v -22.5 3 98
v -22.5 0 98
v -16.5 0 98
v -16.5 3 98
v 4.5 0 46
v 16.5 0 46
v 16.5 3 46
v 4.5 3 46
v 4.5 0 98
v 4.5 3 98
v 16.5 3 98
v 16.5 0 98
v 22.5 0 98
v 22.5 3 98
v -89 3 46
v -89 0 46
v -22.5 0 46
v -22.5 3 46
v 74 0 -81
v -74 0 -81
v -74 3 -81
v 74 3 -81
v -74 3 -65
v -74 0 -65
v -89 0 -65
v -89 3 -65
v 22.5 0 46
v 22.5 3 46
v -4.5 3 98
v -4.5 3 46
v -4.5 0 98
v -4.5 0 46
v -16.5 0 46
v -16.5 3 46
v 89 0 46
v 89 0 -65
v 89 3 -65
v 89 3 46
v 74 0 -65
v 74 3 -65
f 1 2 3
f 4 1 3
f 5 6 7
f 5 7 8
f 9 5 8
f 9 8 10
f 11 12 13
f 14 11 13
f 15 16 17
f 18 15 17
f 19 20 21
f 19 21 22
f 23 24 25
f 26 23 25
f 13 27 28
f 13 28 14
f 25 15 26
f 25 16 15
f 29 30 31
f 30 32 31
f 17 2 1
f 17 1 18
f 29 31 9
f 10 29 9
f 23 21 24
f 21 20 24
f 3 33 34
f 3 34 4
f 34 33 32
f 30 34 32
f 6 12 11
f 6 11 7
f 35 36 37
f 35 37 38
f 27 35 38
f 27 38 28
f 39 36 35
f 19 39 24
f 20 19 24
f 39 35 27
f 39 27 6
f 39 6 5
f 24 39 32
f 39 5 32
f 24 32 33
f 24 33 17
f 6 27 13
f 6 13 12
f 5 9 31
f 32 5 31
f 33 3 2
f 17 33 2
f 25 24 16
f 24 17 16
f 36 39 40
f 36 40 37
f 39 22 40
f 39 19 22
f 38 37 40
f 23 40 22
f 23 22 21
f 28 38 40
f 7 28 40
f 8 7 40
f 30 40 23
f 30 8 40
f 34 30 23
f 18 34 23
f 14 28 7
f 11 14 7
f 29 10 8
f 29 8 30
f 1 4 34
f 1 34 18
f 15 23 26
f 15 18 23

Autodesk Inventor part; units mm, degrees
ref_plane "YZ Plane" through (0, 0, 0) normal (1, 0, 0) x (0, 1, 0)
ref_plane "XZ Plane" through (0, 0, 0) normal (0, 1, 0) x (-1, 0, 0)
ref_plane "XY Plane" through (0, 0, 0) normal (0, 0, 1) x (1, 0, 0)
sketch "Sketch2" plane through (0, 0, 0) normal (0, 1, 0) x (-1, 0, 0)
  line L0 (-89, 99) -> (89, 99)
  line L1 (89, 99) -> (89, -99)
  line L2 (89, -99) -> (-89, -99)
  line L3 (-89, -99) -> (-89, 99)
  line L4 (-89, 99) -> (89, -99) construction
  line L5 (89, 99) -> (-89, -99) construction
  line L6 (-89, 99) -> (89, 99)
  line L7 (89, 99) -> (89, -81)
  line L8 (89, -81) -> (-89, -81)
  line L9 (-89, -81) -> (-89, 99)
  line L10 (-4.5, 99) -> (-89, 99)
  line L11 (-89, 99) -> (-89, 46)
  line L12 (-89, 46) -> (-4.5, 46)
  line L13 (-4.5, 46) -> (-4.5, 99)
  line L14 (4.5, 99) -> (89, 99)
  line L15 (89, 99) -> (89, 46)
  line L16 (89, 46) -> (4.5, 46)
  line L17 (4.5, 46) -> (4.5, 99)
  line L18 (22.5, 77.5) -> (22.5, 66.5) projected
  line L19 (16.5, 66.5) -> (16.5, 77.5) projected
  line L20 (-22.5, 66.5) -> (-22.5, 77.5) projected
  line L21 (-16.5, 77.5) -> (-16.5, 66.5) projected
  line L22 (-22.5, 99) -> (-16.5, 99)
  line L23 (-16.5, 99) -> (-16.5, 46)
  line L24 (-16.5, 46) -> (-22.5, 46)
  line L25 (-22.5, 46) -> (-22.5, 99)
  line L26 (16.5, 99) -> (22.5, 99)
  line L27 (22.5, 99) -> (22.5, 46)
  line L28 (22.5, 46) -> (16.5, 46)
  line L29 (16.5, 46) -> (16.5, 99)
  line L30 (-89, 99) -> (89, 99)
  line L31 (89, 99) -> (89, 98)
  line L32 (89, 98) -> (-89, 98)
  line L33 (-89, 98) -> (-89, 99)
  line L34 (89, -81) -> (74, -81)
  line L35 (74, -81) -> (74, -65)
  line L36 (74, -65) -> (89, -65)
  line L37 (89, -65) -> (89, -81)
  line L38 (-89, -81) -> (-74, -81)
  line L39 (-74, -81) -> (-74, -65)
  line L40 (-74, -65) -> (-89, -65)
  line L41 (-89, -65) -> (-89, -81)
  point P0 (0, 0)
  point P1 (4.5, 99)
  point P2 (-4.5, 99)
  point P3 (-89, 46)
  point P4 (89, 46)
  point P5 (4.5, 98)
  point P6 (-4.5, 98)
  point P7 (-16.5, 98)
  point P8 (-22.5, 98)
  point P9 (22.5, 98)
  point P10 (16.5, 98)
  dimension "d8" = 178
  dimension "d9" = 198
  dimension "d10" = 18
  dimension "d11" = 84.5
  dimension "d12" = 53
  dimension "d13" = 84.5
  dimension "d14" = 53
  dimension "d17" = 9
  dimension "d18" = 1
  dimension "d19" = 15
  dimension "d20" = 16
  dimension "d21" = 15
  dimension "d22" = 16
extrude "Extrusion2" add sketch "Sketch2" along normal blind 3 contours L32 L23 L21 L12 L25 L20 | L12 L13 L32 L17 L16 L1 L36 L35 L8 L39 L40 L3 | L32 L27 L18 L16 L29 L19
equation "\"d11\" = d13"
properties part number "base" material "Aluminum 6061-AHC"
